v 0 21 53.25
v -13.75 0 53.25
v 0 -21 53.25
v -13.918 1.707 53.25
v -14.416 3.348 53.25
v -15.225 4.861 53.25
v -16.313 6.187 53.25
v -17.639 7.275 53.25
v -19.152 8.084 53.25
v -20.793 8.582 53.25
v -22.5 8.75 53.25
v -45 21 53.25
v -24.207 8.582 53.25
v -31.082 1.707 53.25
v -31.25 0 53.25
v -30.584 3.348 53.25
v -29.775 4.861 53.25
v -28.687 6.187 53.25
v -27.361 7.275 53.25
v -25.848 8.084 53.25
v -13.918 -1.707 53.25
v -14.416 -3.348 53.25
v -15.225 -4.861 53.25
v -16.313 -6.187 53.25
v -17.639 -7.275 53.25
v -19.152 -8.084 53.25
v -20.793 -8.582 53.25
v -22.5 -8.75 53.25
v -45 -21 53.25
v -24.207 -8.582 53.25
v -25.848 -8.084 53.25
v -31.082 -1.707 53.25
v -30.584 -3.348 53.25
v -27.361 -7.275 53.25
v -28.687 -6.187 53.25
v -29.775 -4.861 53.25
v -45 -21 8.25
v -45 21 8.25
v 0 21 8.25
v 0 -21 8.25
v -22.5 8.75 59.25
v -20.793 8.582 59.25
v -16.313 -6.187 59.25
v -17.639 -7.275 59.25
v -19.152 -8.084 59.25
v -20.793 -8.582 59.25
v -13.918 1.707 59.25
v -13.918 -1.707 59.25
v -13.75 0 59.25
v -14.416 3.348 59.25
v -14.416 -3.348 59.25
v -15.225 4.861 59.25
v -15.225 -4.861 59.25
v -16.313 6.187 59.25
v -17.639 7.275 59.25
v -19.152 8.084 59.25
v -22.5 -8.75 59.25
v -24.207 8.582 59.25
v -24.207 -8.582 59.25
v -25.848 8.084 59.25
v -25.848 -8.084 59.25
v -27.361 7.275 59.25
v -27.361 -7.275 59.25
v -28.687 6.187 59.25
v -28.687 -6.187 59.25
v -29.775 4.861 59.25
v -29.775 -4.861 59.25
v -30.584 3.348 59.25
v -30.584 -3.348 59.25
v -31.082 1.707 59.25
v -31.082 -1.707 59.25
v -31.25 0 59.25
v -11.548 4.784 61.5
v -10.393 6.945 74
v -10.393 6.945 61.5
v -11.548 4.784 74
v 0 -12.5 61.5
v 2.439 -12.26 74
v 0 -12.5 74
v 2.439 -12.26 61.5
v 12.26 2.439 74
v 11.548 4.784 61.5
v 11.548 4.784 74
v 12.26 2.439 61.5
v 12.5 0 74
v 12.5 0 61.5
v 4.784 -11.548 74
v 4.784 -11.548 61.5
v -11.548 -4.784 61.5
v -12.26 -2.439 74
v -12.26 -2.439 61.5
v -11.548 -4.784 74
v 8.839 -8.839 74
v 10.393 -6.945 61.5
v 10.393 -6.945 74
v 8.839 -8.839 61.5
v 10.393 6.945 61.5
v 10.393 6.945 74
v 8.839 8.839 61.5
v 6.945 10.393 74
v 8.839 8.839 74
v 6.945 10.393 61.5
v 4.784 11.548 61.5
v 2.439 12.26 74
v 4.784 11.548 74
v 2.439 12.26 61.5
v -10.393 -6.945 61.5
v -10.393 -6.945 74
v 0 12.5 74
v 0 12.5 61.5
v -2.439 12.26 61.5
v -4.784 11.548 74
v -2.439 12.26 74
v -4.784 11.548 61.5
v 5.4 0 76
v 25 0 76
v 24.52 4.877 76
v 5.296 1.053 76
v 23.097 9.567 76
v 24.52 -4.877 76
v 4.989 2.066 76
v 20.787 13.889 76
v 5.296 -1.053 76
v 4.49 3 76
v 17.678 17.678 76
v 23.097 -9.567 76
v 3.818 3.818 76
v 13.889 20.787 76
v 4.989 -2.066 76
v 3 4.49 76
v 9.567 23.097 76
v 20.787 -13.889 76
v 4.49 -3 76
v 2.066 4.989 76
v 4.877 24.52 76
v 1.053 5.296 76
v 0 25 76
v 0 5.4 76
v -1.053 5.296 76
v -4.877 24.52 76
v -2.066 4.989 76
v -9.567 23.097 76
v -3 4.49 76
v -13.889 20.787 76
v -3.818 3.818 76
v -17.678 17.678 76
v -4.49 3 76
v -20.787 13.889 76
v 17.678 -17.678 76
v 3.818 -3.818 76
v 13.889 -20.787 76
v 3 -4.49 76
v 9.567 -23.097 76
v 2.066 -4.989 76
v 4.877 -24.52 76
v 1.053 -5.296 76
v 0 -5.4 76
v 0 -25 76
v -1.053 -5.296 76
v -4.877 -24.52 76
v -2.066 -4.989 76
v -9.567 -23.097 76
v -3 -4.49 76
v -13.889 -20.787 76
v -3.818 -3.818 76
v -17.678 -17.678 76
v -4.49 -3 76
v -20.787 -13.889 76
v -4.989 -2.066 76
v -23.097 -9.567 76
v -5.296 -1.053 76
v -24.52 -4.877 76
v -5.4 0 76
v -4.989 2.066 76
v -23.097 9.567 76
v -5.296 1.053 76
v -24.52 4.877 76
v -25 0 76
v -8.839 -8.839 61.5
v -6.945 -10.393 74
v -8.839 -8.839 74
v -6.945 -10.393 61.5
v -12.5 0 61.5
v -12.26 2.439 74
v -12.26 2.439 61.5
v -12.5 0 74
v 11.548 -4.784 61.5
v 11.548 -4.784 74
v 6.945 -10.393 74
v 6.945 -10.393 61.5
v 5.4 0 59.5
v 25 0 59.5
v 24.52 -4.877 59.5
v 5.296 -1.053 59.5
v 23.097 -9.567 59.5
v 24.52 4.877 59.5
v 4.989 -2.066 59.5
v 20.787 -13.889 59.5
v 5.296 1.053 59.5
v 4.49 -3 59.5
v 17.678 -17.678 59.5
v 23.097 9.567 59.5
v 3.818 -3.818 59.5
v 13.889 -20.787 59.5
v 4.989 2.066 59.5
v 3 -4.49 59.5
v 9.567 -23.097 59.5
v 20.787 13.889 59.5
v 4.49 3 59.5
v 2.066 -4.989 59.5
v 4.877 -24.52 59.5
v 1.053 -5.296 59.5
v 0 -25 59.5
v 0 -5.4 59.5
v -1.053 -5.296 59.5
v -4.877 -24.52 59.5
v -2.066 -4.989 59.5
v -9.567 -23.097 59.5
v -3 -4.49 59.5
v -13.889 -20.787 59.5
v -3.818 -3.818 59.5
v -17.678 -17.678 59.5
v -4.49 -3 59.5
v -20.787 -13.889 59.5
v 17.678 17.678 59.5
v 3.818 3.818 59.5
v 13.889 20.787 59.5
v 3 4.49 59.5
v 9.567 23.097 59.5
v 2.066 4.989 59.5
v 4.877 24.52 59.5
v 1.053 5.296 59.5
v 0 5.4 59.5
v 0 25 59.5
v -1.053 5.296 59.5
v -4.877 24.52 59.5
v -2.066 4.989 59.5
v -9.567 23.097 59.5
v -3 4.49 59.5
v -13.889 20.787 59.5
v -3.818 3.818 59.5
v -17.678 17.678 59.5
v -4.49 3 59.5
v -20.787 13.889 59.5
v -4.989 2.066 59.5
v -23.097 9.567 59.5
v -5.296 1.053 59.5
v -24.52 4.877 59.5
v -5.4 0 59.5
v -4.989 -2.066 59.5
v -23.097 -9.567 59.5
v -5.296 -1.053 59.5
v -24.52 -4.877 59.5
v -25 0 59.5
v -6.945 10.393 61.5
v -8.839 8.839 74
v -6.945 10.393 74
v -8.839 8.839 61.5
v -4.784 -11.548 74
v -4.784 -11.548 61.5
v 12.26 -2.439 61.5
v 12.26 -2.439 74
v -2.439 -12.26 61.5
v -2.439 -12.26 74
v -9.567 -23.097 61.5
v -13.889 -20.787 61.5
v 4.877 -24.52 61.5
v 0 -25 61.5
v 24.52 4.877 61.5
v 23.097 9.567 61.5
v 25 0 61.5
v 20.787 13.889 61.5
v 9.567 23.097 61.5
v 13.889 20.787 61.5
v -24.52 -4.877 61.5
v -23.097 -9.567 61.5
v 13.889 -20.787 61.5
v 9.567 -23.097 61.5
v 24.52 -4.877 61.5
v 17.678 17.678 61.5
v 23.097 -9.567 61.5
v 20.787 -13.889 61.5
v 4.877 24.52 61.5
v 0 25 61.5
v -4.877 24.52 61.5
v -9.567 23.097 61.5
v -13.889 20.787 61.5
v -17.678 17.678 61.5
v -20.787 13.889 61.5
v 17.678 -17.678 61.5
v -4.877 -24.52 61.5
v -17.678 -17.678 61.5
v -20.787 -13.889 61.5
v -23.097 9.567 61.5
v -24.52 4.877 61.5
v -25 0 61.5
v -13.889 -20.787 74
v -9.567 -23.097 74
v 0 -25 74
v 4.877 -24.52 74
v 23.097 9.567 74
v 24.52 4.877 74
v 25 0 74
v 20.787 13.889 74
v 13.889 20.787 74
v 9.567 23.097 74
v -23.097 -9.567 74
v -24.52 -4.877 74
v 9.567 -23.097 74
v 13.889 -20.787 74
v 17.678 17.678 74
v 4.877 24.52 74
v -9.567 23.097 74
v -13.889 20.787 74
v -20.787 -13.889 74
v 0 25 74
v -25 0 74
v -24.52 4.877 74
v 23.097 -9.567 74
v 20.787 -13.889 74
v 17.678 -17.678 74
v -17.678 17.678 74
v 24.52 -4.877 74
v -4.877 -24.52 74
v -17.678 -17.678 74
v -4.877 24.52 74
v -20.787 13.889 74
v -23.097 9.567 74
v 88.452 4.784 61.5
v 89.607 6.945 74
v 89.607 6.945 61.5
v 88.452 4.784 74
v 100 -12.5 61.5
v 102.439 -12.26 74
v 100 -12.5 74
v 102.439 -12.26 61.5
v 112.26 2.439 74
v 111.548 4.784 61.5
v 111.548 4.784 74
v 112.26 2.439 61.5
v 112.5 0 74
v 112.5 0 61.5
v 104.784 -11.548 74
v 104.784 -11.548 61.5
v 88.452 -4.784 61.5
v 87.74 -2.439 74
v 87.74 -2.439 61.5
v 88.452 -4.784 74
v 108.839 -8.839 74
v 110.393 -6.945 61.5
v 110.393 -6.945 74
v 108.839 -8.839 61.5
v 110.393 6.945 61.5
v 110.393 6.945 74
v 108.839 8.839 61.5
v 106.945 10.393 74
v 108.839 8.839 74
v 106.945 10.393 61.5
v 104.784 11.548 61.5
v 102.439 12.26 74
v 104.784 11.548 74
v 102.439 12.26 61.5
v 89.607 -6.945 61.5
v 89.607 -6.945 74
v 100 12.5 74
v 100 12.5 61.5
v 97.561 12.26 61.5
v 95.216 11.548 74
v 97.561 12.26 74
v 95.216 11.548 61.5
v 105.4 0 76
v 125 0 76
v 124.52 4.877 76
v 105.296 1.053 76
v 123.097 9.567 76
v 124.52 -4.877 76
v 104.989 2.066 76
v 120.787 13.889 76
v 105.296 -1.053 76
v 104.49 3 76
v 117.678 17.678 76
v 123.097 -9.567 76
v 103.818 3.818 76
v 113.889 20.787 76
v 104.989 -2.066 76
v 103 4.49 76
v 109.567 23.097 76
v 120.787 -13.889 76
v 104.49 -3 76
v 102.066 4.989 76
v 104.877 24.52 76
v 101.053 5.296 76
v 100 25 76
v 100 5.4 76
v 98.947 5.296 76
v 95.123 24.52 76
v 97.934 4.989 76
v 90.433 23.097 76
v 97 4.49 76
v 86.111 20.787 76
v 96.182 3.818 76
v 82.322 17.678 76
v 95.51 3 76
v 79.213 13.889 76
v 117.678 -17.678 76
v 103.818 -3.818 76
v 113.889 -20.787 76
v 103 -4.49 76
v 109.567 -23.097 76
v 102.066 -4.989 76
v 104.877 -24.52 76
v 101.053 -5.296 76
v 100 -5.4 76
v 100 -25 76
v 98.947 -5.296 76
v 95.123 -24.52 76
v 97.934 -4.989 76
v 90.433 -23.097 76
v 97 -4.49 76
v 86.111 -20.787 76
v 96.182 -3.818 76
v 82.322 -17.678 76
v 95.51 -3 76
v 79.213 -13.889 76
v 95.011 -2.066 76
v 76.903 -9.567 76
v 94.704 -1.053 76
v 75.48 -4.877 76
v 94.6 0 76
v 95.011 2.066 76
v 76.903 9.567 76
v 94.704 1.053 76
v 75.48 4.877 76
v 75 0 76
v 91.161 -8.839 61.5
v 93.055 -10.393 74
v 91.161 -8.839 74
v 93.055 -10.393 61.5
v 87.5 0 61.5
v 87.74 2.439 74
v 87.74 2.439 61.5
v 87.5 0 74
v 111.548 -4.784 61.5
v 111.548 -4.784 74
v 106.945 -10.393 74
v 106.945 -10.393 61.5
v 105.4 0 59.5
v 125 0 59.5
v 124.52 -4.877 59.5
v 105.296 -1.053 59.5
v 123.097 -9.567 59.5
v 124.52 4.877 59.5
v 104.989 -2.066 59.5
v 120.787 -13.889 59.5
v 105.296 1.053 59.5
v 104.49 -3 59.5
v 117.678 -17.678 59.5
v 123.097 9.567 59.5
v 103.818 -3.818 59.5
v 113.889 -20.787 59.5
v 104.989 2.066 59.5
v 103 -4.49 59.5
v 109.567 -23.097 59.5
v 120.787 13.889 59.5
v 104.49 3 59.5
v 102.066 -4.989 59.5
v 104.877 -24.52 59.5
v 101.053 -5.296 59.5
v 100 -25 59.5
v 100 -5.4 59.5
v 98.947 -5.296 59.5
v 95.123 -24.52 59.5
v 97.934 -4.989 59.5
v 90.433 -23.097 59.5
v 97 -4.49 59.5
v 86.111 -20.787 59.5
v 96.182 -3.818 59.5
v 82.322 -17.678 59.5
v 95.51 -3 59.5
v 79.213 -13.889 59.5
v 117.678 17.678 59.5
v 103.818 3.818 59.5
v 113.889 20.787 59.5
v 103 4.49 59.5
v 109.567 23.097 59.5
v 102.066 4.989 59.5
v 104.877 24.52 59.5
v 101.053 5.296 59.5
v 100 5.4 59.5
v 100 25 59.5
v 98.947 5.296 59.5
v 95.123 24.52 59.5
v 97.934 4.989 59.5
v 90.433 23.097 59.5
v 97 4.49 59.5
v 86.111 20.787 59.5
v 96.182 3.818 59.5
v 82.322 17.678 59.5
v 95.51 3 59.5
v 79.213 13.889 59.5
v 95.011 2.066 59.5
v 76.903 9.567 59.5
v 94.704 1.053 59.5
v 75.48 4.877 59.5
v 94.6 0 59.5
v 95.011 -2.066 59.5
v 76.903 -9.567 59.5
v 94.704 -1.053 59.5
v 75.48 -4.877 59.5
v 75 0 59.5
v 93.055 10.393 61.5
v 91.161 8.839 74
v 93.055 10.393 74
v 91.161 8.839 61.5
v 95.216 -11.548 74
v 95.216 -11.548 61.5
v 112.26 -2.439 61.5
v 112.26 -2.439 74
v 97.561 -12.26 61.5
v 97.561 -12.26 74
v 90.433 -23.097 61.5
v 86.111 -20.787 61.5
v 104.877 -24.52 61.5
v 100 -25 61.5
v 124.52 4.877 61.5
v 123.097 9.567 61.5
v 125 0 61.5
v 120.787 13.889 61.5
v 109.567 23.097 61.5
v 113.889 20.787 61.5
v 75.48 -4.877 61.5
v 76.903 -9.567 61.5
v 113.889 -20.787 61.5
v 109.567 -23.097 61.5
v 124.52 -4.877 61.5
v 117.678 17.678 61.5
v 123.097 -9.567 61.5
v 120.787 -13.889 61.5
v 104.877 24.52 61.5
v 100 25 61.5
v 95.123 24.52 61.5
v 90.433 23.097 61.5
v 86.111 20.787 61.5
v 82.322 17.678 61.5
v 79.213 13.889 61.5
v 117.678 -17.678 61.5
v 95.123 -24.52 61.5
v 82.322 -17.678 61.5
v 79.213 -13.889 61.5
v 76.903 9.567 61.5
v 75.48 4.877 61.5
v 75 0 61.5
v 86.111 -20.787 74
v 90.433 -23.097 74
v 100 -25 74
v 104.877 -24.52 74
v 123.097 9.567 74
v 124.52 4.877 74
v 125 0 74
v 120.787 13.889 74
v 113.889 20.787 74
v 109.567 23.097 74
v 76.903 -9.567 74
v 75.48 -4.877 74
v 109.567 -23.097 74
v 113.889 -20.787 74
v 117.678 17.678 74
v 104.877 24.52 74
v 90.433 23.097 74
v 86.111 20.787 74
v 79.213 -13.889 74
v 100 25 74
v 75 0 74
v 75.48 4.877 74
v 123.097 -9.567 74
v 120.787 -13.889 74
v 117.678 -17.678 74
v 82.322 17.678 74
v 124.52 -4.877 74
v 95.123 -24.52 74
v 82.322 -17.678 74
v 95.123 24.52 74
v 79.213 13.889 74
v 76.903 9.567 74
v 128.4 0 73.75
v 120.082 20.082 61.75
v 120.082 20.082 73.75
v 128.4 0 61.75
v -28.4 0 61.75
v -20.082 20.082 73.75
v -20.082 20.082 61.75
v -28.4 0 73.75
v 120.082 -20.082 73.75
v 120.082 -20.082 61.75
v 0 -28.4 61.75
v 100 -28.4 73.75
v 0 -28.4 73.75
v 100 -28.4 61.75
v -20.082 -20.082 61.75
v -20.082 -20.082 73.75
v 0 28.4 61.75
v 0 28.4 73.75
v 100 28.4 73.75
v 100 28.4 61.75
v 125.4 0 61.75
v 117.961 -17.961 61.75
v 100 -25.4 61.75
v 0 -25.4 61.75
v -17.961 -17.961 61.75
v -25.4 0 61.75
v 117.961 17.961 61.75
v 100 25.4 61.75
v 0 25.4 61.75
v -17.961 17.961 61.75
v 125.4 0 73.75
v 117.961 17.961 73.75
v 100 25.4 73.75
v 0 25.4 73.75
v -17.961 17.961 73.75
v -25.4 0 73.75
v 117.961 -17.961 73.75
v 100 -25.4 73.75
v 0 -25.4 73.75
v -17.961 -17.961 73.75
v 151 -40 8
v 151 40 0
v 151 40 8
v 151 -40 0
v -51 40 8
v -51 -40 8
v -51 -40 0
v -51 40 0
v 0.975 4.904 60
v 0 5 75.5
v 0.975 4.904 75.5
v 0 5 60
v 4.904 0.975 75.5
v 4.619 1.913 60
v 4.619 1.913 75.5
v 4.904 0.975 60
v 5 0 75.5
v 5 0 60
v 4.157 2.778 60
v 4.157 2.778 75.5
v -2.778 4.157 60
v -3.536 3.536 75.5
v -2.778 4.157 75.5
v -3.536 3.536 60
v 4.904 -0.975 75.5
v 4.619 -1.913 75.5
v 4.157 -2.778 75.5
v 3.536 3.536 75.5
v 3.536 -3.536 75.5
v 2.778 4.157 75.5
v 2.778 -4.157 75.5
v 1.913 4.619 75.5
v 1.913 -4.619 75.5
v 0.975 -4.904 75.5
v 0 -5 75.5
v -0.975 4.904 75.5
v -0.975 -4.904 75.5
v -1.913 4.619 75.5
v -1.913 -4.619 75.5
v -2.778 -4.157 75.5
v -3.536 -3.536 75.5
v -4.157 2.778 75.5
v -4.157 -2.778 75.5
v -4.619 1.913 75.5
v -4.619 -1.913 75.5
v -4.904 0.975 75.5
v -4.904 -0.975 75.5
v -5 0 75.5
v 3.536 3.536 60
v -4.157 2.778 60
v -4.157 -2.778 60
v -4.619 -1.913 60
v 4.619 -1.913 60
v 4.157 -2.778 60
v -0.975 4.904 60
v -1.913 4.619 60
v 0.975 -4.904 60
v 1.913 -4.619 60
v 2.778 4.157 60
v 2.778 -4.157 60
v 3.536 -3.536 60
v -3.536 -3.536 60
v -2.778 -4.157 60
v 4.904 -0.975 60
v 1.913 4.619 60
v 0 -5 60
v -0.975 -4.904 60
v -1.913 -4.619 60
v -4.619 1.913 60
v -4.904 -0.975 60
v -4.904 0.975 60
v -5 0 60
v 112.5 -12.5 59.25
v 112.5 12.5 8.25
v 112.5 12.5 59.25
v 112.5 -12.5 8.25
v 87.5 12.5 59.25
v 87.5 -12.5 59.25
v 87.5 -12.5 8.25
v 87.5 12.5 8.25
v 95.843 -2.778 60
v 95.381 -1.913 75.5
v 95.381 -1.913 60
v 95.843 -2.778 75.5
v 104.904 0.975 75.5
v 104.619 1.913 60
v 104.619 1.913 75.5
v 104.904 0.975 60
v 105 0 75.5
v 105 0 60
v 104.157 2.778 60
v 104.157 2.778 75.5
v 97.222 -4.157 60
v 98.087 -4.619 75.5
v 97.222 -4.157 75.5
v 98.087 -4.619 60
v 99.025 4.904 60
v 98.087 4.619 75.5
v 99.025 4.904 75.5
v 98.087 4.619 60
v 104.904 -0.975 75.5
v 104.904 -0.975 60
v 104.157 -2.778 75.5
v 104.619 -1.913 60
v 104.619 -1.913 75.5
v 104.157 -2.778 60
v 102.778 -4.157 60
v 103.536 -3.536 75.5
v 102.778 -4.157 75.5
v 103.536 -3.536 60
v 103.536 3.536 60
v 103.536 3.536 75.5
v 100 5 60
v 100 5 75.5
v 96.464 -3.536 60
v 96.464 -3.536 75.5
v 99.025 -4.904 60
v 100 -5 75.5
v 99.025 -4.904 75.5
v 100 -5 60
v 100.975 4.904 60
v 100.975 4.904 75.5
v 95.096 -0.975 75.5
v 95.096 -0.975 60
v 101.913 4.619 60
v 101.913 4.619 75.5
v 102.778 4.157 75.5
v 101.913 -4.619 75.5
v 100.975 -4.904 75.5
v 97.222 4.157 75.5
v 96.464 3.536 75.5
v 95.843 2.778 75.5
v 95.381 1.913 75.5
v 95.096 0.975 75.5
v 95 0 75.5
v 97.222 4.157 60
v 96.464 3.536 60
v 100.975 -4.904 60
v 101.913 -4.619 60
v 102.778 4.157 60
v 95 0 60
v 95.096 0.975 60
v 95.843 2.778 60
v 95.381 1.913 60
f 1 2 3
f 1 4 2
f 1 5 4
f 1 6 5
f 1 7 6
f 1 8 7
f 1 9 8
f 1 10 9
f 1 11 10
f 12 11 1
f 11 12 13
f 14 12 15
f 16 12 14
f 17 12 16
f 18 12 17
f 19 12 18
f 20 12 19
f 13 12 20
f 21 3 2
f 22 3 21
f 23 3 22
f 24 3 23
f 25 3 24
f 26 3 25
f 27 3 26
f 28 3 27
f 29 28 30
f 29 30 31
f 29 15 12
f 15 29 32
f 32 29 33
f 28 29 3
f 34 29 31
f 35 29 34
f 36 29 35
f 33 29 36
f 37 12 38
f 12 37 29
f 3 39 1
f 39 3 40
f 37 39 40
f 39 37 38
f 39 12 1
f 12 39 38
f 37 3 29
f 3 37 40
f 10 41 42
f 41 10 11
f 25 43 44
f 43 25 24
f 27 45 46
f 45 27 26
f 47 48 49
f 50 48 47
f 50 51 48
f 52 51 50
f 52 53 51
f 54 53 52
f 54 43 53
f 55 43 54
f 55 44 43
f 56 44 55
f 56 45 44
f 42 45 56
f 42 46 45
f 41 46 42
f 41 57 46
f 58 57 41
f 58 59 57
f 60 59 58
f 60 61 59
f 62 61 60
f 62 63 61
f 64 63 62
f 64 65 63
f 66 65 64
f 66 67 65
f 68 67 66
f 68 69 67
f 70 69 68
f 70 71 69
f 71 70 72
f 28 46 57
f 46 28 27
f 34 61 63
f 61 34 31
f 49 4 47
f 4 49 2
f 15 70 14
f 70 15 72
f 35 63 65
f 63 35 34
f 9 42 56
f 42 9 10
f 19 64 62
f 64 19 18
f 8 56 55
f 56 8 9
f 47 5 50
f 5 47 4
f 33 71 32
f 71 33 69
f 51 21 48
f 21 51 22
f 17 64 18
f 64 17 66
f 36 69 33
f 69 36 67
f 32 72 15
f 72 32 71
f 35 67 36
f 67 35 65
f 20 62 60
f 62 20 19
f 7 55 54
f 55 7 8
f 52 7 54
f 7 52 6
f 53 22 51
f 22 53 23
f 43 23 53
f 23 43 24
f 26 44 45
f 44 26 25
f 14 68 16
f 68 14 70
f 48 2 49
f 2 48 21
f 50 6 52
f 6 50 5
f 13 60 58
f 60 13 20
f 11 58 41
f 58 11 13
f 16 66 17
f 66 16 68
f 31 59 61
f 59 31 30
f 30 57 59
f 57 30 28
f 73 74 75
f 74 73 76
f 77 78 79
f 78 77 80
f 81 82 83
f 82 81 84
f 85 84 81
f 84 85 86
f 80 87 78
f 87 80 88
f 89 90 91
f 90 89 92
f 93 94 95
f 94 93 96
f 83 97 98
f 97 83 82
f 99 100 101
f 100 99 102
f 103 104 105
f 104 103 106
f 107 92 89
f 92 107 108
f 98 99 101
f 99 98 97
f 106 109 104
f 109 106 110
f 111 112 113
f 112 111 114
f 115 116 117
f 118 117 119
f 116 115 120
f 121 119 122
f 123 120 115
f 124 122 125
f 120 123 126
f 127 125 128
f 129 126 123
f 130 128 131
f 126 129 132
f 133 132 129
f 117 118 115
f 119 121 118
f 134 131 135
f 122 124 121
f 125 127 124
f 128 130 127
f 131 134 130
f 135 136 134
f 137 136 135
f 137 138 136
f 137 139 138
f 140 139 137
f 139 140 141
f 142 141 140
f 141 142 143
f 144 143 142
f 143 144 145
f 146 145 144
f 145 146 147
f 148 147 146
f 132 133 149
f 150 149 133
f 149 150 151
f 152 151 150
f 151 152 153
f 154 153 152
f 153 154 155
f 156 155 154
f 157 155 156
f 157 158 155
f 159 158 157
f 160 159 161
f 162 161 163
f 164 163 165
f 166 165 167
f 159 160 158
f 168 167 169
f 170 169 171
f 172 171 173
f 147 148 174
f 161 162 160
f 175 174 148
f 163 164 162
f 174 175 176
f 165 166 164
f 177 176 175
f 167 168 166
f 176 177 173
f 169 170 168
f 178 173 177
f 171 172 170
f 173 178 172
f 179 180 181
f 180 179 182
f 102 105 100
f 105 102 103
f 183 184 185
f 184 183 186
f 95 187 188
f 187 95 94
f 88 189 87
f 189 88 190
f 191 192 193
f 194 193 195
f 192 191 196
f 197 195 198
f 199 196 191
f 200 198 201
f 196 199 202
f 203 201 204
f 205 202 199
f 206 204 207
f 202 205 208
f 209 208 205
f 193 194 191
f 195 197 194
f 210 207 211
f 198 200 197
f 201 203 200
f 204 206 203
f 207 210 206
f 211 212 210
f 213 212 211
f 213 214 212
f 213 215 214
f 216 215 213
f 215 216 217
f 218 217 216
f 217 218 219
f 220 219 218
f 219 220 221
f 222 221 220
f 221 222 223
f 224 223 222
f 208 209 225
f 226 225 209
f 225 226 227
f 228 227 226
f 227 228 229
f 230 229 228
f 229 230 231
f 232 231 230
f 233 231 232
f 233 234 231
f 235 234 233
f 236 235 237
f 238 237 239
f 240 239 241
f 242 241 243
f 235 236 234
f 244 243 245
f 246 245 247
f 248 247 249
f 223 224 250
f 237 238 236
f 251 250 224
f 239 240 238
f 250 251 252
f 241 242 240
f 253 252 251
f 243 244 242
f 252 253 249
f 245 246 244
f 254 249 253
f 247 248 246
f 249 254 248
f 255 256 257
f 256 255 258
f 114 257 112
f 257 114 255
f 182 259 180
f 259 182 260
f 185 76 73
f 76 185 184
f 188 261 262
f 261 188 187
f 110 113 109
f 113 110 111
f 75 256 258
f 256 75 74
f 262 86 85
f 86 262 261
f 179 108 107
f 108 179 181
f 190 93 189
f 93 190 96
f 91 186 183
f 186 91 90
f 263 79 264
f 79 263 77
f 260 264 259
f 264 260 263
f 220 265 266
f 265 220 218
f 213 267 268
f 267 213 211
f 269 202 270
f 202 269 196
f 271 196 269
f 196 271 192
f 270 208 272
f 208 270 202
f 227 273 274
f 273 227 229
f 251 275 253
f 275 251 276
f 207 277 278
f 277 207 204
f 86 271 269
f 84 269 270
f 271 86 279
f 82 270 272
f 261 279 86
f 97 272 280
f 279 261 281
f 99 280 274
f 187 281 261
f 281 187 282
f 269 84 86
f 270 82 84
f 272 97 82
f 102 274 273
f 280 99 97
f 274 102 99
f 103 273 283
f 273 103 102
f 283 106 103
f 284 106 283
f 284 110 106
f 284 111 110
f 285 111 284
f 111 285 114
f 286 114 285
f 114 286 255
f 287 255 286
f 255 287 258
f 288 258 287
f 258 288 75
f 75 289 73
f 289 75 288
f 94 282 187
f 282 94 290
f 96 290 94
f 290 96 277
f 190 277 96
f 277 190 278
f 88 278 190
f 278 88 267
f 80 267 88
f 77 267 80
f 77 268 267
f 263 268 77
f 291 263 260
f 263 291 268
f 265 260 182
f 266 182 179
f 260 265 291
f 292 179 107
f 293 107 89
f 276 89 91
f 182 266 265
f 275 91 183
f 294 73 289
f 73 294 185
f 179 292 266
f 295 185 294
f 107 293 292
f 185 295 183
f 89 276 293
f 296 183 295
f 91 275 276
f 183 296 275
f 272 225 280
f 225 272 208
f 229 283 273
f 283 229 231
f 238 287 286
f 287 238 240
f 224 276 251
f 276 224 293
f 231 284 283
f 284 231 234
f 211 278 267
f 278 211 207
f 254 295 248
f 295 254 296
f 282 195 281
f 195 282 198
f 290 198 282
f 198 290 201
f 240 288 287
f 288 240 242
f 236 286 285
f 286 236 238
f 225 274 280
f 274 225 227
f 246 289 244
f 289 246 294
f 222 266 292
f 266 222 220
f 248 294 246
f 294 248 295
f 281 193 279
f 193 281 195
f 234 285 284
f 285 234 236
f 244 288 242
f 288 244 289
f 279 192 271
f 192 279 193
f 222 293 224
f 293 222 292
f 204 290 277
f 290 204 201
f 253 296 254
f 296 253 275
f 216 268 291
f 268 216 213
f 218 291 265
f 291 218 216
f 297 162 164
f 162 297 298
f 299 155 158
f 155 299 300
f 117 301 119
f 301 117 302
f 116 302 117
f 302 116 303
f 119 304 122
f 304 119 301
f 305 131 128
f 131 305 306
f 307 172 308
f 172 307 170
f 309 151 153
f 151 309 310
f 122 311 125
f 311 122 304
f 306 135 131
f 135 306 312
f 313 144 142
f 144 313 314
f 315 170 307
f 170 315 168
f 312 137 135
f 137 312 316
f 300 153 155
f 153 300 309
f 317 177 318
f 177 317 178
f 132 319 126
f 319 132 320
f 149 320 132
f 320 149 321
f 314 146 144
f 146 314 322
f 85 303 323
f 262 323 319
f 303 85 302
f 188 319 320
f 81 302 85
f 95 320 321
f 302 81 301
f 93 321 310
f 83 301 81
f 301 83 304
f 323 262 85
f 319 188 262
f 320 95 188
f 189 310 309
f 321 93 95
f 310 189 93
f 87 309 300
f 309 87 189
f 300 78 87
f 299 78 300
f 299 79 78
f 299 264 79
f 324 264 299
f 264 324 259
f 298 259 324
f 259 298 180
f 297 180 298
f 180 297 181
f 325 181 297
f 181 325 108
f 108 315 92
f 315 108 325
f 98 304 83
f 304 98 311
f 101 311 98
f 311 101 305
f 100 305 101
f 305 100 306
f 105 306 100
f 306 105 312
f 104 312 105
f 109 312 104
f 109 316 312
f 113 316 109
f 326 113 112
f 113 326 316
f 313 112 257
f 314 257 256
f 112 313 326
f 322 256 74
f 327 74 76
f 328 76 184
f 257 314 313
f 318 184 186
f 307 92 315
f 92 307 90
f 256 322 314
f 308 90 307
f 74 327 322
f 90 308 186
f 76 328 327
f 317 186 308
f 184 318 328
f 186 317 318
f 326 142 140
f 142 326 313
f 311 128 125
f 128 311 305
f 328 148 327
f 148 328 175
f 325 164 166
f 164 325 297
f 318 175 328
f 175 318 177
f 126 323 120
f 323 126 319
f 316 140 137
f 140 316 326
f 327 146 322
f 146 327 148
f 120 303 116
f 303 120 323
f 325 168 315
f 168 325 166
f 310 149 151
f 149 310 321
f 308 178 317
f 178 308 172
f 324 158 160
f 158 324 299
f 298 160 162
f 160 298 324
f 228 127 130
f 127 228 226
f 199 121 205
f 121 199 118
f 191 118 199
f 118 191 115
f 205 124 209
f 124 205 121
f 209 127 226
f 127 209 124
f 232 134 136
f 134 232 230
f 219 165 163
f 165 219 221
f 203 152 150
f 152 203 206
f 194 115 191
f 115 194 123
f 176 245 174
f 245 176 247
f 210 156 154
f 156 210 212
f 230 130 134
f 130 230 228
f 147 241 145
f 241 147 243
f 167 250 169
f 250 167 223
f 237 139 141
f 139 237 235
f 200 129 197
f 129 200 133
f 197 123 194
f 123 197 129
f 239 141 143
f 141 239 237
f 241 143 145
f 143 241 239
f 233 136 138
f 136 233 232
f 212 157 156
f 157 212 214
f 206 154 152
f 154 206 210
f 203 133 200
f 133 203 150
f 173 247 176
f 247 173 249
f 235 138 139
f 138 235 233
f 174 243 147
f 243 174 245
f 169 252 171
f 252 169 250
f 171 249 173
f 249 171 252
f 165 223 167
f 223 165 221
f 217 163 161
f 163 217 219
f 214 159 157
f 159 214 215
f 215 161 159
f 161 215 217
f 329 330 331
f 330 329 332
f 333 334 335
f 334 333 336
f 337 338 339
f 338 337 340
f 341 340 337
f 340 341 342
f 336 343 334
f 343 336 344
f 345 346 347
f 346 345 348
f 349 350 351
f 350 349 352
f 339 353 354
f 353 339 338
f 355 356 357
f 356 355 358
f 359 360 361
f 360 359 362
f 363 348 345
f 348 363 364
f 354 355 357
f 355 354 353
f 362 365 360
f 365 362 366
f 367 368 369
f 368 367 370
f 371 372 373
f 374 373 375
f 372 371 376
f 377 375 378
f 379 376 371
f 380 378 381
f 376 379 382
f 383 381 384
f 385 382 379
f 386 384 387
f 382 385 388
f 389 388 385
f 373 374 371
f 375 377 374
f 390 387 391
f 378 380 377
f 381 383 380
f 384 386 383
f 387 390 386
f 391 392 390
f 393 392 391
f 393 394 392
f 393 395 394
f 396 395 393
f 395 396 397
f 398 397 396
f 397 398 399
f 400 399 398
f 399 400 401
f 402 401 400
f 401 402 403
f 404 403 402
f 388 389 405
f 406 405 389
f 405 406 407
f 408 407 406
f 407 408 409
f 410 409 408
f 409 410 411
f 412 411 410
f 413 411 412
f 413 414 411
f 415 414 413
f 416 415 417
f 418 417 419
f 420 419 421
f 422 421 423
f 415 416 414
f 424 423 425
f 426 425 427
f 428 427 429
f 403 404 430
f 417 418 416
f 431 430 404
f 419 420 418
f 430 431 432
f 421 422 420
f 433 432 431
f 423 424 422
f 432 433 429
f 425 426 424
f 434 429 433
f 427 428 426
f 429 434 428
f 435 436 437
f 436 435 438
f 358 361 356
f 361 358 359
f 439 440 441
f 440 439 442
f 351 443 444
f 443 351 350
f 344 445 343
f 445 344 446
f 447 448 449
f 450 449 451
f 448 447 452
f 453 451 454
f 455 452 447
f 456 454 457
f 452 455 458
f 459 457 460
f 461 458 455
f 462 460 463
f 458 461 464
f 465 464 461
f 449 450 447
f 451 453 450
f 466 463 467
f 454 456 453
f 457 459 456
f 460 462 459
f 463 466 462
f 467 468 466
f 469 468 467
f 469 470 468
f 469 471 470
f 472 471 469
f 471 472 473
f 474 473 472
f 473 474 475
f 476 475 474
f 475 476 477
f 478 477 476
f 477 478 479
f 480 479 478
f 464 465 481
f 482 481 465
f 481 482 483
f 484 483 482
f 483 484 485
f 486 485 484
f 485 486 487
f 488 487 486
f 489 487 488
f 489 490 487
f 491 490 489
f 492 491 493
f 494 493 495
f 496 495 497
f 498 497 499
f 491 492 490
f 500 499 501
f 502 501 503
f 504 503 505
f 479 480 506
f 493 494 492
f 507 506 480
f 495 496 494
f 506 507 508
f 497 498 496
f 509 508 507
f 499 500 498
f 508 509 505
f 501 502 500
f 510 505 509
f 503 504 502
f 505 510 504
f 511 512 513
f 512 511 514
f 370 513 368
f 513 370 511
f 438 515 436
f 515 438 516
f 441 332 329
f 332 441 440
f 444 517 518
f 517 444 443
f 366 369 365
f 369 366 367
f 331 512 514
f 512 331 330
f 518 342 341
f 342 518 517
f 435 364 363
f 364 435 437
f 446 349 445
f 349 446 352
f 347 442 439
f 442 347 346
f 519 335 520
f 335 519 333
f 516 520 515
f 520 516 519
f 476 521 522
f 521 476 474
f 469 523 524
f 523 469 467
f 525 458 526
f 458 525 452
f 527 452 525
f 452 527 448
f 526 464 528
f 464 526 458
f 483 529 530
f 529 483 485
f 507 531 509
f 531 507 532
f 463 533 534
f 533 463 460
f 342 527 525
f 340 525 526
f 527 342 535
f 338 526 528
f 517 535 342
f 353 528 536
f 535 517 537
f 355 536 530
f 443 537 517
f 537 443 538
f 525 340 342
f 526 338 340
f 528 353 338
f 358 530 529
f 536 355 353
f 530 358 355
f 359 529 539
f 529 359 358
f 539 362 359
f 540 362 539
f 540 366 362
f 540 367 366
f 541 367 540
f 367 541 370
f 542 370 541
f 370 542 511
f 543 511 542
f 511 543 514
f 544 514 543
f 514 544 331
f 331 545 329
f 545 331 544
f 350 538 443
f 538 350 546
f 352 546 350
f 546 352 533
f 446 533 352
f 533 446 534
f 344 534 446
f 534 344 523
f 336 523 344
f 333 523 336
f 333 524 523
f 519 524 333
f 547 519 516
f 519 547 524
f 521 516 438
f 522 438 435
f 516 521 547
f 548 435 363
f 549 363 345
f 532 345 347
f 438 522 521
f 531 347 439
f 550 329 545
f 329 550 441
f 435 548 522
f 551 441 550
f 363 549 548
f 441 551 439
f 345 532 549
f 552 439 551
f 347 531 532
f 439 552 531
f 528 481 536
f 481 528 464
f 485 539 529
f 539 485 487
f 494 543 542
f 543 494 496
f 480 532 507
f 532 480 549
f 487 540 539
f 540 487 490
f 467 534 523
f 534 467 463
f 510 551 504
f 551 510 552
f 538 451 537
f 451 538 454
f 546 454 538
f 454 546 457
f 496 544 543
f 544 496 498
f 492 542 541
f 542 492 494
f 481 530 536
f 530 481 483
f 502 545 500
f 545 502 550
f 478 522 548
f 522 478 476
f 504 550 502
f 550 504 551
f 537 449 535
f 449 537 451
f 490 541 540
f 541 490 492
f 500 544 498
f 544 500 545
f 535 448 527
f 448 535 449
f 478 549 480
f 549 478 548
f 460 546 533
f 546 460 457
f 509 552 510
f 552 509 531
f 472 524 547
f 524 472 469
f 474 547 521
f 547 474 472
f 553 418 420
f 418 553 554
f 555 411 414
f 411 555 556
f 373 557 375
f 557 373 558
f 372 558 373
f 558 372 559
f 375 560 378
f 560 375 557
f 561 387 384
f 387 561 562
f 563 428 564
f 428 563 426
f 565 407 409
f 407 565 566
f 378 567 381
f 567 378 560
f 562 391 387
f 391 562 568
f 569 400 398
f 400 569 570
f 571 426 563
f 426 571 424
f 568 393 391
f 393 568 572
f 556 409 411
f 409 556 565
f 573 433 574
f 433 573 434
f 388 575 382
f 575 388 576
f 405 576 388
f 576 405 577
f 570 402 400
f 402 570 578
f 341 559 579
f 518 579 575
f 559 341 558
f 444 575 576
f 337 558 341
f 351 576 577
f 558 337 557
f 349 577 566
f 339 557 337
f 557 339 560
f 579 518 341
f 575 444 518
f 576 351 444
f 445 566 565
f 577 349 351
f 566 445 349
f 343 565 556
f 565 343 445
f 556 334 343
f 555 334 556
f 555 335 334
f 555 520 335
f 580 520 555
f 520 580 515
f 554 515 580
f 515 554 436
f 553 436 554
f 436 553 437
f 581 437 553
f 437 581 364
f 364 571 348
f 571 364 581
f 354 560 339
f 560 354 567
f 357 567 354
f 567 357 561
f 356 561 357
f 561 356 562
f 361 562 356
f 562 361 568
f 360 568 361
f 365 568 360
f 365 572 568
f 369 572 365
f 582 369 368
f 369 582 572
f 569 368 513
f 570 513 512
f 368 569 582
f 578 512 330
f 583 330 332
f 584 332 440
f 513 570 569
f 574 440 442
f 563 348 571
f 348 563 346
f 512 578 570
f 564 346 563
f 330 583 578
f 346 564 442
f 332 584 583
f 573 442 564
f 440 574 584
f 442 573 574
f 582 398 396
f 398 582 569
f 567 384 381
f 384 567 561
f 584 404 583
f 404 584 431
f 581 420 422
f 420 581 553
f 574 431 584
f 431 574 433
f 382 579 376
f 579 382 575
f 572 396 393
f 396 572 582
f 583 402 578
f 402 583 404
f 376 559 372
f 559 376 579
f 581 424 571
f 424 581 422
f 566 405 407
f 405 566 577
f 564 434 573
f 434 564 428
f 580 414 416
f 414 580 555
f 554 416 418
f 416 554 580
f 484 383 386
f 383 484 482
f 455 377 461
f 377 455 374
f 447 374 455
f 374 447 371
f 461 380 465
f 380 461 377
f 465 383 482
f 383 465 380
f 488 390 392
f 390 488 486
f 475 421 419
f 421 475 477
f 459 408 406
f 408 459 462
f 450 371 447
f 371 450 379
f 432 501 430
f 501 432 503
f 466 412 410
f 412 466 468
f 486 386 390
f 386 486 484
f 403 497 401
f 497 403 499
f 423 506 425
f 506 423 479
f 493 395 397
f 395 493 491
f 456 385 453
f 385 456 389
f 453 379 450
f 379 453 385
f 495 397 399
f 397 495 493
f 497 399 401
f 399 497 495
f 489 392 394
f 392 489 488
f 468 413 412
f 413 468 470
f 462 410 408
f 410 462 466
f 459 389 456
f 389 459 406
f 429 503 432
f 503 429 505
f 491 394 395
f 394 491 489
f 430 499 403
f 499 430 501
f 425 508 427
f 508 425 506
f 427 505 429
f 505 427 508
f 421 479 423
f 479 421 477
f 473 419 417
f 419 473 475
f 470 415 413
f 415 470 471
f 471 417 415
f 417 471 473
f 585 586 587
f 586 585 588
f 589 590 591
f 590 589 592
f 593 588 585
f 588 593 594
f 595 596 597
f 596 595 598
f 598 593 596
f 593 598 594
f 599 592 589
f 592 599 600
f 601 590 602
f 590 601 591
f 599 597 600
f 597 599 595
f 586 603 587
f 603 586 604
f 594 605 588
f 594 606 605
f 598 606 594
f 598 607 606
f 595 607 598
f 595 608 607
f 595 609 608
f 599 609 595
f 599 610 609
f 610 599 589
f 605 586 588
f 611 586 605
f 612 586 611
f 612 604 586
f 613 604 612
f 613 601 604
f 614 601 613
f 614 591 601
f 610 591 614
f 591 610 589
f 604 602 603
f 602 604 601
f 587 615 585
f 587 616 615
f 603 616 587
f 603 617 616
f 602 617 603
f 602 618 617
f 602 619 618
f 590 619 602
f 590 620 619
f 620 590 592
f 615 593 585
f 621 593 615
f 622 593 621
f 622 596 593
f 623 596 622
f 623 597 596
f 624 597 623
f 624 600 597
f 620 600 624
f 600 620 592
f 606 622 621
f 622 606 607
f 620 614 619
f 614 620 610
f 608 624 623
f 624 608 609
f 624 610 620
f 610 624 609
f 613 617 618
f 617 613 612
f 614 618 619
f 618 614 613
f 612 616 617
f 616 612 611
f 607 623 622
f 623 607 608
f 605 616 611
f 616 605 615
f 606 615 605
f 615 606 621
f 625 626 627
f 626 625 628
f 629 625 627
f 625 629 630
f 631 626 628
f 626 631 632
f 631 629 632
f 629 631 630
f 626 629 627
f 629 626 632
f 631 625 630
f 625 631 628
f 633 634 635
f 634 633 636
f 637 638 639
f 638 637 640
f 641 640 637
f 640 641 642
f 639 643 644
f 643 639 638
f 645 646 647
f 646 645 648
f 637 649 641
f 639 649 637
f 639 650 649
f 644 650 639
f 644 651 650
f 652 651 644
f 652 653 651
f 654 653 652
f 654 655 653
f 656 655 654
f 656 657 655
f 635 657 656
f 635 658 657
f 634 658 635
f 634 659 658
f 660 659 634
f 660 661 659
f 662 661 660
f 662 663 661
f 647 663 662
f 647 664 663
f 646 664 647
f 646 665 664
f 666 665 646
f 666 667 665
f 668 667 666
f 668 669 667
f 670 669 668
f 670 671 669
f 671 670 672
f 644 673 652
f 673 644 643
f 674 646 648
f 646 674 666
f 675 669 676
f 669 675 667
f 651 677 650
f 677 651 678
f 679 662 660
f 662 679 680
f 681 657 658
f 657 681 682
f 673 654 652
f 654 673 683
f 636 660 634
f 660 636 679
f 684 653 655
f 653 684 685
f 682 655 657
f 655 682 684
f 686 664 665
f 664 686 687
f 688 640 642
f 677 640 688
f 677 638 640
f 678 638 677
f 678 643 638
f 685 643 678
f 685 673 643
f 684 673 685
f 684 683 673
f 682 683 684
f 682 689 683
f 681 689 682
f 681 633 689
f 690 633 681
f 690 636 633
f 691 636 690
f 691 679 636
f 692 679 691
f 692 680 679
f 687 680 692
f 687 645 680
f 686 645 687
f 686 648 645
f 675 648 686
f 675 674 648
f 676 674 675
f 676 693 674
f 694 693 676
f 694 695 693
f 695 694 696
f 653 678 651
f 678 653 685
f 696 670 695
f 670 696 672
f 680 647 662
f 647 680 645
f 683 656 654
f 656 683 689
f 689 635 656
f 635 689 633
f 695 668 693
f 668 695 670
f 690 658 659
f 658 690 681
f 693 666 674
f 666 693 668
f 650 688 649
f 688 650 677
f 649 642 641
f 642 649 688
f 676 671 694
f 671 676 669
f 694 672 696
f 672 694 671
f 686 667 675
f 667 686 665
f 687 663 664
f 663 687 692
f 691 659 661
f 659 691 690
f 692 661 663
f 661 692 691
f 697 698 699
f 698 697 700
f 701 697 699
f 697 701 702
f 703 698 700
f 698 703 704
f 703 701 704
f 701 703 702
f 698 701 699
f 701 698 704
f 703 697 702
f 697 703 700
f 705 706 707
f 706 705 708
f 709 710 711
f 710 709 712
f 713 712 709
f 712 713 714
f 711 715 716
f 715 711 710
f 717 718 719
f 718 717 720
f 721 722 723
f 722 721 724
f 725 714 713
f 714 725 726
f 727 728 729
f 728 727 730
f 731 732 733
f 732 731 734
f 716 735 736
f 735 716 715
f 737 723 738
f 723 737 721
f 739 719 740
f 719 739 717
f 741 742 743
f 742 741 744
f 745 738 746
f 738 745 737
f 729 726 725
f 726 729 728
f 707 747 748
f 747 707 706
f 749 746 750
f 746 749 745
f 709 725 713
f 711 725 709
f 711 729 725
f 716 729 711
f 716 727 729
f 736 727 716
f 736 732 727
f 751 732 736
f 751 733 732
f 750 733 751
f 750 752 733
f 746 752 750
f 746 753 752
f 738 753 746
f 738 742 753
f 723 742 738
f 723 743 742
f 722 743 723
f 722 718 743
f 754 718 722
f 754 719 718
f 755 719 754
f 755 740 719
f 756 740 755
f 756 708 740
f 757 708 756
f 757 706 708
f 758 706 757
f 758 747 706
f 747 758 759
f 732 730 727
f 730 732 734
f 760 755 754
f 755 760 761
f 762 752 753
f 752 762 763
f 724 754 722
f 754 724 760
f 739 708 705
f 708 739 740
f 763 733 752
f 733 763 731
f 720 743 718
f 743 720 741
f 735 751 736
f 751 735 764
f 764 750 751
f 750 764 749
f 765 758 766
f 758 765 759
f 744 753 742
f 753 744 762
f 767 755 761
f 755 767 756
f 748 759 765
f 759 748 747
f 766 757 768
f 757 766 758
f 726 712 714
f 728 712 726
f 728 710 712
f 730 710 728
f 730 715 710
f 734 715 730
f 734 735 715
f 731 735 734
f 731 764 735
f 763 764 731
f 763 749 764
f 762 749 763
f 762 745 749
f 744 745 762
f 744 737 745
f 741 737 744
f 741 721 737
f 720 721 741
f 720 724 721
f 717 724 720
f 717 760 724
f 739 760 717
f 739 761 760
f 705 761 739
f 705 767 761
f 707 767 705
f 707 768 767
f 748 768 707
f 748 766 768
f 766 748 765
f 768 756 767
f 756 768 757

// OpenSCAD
$fn = 32;

// ------------------------------------------------------------------------
// Motor belt drive: span 100 mm, pulleys d50, belt 12 mm wide
// Every part is its own module, assembly() places every instance.
// ------------------------------------------------------------------------

// --- part 1 ---
module base_plate() {
  difference() {
    translate([-101, -40, 0]) cube([202, 80, 8]);
  }
}

// --- part 2 ---
module motor() {
  union() {
    translate([-22.5, -21, 0]) cube([45, 42, 45]);
    translate([25.5, 0, 22.5]) rotate([0, 90, 0]) cylinder(h = 6, d = 17.5, center = true);
  }
}

// --- part 3 ---
module drive_shaft() {
  translate([0, 0, -7.75]) cylinder(h = 15.5, d = 10);
}

// --- part 4 ---
module pulley_drive() {
  difference() {
    union() {
      cylinder(h = 16.5, d = 25);
      cylinder(h = 2, d = 50);
      translate([0, 0, 14.5]) cylinder(h = 2, d = 50);
    }
    translate([0, 0, -1]) cylinder(h = 18.5, d = 10.8);
  }
}

// --- part 5 ---
module idler_post() {
  translate([-12.5, -12.5, 0]) cube([25, 25, 51]);
}

// --- part 6 ---
module driven_shaft() {
  translate([0, 0, -7.75]) cylinder(h = 15.5, d = 10);
}

// --- part 7 ---
module pulley_driven() {
  difference() {
    union() {
      cylinder(h = 16.5, d = 25);
      cylinder(h = 2, d = 50);
      translate([0, 0, 14.5]) cylinder(h = 2, d = 50);
    }
    translate([0, 0, -1]) cylinder(h = 18.5, d = 10.8);
  }
}

// --- part 8 ---
module drive_belt() {
  difference() {
    linear_extrude(height = 12) polygon(points = concat([for (a = [90 : 45 : 270]) [28.4 * cos(a), 28.4 * sin(a)]], [for (a = [270 : 45 : 450]) [100 + 28.4 * cos(a), 28.4 * sin(a)]]));
    translate([0, 0, -1]) linear_extrude(height = 14) polygon(points = concat([for (a = [90 : 45 : 270]) [25.4 * cos(a), 25.4 * sin(a)]], [for (a = [270 : 45 : 450]) [100 + 25.4 * cos(a), 25.4 * sin(a)]]));
  }
}

// --- assembly ---
module assembly() {
  color([0.80, 0.24, 0.20]) translate([50, 0, 0]) rotate([0, 0, 0]) base_plate();
  color([0.20, 0.45, 0.75]) translate([0, 0, 30.75]) rotate([0, 270, 0]) motor();
  color([0.25, 0.62, 0.32]) translate([0, 0, 67.75]) rotate([0, 0, 0]) drive_shaft();
  color([0.92, 0.70, 0.18]) translate([0, 0, 59.5]) rotate([0, 0, 0]) pulley_drive();
  color([0.58, 0.35, 0.70]) translate([100, 0, 8.25]) rotate([0, 0, 0]) idler_post();
  color([0.16, 0.66, 0.66]) translate([100, 0, 67.75]) rotate([0, 0, 0]) driven_shaft();
  color([0.85, 0.48, 0.18]) translate([100, 0, 59.5]) rotate([0, 0, 0]) pulley_driven();
  color([0.55, 0.60, 0.65]) translate([0, 0, 61.75]) rotate([0, 0, 0]) drive_belt();
}

assembly();
